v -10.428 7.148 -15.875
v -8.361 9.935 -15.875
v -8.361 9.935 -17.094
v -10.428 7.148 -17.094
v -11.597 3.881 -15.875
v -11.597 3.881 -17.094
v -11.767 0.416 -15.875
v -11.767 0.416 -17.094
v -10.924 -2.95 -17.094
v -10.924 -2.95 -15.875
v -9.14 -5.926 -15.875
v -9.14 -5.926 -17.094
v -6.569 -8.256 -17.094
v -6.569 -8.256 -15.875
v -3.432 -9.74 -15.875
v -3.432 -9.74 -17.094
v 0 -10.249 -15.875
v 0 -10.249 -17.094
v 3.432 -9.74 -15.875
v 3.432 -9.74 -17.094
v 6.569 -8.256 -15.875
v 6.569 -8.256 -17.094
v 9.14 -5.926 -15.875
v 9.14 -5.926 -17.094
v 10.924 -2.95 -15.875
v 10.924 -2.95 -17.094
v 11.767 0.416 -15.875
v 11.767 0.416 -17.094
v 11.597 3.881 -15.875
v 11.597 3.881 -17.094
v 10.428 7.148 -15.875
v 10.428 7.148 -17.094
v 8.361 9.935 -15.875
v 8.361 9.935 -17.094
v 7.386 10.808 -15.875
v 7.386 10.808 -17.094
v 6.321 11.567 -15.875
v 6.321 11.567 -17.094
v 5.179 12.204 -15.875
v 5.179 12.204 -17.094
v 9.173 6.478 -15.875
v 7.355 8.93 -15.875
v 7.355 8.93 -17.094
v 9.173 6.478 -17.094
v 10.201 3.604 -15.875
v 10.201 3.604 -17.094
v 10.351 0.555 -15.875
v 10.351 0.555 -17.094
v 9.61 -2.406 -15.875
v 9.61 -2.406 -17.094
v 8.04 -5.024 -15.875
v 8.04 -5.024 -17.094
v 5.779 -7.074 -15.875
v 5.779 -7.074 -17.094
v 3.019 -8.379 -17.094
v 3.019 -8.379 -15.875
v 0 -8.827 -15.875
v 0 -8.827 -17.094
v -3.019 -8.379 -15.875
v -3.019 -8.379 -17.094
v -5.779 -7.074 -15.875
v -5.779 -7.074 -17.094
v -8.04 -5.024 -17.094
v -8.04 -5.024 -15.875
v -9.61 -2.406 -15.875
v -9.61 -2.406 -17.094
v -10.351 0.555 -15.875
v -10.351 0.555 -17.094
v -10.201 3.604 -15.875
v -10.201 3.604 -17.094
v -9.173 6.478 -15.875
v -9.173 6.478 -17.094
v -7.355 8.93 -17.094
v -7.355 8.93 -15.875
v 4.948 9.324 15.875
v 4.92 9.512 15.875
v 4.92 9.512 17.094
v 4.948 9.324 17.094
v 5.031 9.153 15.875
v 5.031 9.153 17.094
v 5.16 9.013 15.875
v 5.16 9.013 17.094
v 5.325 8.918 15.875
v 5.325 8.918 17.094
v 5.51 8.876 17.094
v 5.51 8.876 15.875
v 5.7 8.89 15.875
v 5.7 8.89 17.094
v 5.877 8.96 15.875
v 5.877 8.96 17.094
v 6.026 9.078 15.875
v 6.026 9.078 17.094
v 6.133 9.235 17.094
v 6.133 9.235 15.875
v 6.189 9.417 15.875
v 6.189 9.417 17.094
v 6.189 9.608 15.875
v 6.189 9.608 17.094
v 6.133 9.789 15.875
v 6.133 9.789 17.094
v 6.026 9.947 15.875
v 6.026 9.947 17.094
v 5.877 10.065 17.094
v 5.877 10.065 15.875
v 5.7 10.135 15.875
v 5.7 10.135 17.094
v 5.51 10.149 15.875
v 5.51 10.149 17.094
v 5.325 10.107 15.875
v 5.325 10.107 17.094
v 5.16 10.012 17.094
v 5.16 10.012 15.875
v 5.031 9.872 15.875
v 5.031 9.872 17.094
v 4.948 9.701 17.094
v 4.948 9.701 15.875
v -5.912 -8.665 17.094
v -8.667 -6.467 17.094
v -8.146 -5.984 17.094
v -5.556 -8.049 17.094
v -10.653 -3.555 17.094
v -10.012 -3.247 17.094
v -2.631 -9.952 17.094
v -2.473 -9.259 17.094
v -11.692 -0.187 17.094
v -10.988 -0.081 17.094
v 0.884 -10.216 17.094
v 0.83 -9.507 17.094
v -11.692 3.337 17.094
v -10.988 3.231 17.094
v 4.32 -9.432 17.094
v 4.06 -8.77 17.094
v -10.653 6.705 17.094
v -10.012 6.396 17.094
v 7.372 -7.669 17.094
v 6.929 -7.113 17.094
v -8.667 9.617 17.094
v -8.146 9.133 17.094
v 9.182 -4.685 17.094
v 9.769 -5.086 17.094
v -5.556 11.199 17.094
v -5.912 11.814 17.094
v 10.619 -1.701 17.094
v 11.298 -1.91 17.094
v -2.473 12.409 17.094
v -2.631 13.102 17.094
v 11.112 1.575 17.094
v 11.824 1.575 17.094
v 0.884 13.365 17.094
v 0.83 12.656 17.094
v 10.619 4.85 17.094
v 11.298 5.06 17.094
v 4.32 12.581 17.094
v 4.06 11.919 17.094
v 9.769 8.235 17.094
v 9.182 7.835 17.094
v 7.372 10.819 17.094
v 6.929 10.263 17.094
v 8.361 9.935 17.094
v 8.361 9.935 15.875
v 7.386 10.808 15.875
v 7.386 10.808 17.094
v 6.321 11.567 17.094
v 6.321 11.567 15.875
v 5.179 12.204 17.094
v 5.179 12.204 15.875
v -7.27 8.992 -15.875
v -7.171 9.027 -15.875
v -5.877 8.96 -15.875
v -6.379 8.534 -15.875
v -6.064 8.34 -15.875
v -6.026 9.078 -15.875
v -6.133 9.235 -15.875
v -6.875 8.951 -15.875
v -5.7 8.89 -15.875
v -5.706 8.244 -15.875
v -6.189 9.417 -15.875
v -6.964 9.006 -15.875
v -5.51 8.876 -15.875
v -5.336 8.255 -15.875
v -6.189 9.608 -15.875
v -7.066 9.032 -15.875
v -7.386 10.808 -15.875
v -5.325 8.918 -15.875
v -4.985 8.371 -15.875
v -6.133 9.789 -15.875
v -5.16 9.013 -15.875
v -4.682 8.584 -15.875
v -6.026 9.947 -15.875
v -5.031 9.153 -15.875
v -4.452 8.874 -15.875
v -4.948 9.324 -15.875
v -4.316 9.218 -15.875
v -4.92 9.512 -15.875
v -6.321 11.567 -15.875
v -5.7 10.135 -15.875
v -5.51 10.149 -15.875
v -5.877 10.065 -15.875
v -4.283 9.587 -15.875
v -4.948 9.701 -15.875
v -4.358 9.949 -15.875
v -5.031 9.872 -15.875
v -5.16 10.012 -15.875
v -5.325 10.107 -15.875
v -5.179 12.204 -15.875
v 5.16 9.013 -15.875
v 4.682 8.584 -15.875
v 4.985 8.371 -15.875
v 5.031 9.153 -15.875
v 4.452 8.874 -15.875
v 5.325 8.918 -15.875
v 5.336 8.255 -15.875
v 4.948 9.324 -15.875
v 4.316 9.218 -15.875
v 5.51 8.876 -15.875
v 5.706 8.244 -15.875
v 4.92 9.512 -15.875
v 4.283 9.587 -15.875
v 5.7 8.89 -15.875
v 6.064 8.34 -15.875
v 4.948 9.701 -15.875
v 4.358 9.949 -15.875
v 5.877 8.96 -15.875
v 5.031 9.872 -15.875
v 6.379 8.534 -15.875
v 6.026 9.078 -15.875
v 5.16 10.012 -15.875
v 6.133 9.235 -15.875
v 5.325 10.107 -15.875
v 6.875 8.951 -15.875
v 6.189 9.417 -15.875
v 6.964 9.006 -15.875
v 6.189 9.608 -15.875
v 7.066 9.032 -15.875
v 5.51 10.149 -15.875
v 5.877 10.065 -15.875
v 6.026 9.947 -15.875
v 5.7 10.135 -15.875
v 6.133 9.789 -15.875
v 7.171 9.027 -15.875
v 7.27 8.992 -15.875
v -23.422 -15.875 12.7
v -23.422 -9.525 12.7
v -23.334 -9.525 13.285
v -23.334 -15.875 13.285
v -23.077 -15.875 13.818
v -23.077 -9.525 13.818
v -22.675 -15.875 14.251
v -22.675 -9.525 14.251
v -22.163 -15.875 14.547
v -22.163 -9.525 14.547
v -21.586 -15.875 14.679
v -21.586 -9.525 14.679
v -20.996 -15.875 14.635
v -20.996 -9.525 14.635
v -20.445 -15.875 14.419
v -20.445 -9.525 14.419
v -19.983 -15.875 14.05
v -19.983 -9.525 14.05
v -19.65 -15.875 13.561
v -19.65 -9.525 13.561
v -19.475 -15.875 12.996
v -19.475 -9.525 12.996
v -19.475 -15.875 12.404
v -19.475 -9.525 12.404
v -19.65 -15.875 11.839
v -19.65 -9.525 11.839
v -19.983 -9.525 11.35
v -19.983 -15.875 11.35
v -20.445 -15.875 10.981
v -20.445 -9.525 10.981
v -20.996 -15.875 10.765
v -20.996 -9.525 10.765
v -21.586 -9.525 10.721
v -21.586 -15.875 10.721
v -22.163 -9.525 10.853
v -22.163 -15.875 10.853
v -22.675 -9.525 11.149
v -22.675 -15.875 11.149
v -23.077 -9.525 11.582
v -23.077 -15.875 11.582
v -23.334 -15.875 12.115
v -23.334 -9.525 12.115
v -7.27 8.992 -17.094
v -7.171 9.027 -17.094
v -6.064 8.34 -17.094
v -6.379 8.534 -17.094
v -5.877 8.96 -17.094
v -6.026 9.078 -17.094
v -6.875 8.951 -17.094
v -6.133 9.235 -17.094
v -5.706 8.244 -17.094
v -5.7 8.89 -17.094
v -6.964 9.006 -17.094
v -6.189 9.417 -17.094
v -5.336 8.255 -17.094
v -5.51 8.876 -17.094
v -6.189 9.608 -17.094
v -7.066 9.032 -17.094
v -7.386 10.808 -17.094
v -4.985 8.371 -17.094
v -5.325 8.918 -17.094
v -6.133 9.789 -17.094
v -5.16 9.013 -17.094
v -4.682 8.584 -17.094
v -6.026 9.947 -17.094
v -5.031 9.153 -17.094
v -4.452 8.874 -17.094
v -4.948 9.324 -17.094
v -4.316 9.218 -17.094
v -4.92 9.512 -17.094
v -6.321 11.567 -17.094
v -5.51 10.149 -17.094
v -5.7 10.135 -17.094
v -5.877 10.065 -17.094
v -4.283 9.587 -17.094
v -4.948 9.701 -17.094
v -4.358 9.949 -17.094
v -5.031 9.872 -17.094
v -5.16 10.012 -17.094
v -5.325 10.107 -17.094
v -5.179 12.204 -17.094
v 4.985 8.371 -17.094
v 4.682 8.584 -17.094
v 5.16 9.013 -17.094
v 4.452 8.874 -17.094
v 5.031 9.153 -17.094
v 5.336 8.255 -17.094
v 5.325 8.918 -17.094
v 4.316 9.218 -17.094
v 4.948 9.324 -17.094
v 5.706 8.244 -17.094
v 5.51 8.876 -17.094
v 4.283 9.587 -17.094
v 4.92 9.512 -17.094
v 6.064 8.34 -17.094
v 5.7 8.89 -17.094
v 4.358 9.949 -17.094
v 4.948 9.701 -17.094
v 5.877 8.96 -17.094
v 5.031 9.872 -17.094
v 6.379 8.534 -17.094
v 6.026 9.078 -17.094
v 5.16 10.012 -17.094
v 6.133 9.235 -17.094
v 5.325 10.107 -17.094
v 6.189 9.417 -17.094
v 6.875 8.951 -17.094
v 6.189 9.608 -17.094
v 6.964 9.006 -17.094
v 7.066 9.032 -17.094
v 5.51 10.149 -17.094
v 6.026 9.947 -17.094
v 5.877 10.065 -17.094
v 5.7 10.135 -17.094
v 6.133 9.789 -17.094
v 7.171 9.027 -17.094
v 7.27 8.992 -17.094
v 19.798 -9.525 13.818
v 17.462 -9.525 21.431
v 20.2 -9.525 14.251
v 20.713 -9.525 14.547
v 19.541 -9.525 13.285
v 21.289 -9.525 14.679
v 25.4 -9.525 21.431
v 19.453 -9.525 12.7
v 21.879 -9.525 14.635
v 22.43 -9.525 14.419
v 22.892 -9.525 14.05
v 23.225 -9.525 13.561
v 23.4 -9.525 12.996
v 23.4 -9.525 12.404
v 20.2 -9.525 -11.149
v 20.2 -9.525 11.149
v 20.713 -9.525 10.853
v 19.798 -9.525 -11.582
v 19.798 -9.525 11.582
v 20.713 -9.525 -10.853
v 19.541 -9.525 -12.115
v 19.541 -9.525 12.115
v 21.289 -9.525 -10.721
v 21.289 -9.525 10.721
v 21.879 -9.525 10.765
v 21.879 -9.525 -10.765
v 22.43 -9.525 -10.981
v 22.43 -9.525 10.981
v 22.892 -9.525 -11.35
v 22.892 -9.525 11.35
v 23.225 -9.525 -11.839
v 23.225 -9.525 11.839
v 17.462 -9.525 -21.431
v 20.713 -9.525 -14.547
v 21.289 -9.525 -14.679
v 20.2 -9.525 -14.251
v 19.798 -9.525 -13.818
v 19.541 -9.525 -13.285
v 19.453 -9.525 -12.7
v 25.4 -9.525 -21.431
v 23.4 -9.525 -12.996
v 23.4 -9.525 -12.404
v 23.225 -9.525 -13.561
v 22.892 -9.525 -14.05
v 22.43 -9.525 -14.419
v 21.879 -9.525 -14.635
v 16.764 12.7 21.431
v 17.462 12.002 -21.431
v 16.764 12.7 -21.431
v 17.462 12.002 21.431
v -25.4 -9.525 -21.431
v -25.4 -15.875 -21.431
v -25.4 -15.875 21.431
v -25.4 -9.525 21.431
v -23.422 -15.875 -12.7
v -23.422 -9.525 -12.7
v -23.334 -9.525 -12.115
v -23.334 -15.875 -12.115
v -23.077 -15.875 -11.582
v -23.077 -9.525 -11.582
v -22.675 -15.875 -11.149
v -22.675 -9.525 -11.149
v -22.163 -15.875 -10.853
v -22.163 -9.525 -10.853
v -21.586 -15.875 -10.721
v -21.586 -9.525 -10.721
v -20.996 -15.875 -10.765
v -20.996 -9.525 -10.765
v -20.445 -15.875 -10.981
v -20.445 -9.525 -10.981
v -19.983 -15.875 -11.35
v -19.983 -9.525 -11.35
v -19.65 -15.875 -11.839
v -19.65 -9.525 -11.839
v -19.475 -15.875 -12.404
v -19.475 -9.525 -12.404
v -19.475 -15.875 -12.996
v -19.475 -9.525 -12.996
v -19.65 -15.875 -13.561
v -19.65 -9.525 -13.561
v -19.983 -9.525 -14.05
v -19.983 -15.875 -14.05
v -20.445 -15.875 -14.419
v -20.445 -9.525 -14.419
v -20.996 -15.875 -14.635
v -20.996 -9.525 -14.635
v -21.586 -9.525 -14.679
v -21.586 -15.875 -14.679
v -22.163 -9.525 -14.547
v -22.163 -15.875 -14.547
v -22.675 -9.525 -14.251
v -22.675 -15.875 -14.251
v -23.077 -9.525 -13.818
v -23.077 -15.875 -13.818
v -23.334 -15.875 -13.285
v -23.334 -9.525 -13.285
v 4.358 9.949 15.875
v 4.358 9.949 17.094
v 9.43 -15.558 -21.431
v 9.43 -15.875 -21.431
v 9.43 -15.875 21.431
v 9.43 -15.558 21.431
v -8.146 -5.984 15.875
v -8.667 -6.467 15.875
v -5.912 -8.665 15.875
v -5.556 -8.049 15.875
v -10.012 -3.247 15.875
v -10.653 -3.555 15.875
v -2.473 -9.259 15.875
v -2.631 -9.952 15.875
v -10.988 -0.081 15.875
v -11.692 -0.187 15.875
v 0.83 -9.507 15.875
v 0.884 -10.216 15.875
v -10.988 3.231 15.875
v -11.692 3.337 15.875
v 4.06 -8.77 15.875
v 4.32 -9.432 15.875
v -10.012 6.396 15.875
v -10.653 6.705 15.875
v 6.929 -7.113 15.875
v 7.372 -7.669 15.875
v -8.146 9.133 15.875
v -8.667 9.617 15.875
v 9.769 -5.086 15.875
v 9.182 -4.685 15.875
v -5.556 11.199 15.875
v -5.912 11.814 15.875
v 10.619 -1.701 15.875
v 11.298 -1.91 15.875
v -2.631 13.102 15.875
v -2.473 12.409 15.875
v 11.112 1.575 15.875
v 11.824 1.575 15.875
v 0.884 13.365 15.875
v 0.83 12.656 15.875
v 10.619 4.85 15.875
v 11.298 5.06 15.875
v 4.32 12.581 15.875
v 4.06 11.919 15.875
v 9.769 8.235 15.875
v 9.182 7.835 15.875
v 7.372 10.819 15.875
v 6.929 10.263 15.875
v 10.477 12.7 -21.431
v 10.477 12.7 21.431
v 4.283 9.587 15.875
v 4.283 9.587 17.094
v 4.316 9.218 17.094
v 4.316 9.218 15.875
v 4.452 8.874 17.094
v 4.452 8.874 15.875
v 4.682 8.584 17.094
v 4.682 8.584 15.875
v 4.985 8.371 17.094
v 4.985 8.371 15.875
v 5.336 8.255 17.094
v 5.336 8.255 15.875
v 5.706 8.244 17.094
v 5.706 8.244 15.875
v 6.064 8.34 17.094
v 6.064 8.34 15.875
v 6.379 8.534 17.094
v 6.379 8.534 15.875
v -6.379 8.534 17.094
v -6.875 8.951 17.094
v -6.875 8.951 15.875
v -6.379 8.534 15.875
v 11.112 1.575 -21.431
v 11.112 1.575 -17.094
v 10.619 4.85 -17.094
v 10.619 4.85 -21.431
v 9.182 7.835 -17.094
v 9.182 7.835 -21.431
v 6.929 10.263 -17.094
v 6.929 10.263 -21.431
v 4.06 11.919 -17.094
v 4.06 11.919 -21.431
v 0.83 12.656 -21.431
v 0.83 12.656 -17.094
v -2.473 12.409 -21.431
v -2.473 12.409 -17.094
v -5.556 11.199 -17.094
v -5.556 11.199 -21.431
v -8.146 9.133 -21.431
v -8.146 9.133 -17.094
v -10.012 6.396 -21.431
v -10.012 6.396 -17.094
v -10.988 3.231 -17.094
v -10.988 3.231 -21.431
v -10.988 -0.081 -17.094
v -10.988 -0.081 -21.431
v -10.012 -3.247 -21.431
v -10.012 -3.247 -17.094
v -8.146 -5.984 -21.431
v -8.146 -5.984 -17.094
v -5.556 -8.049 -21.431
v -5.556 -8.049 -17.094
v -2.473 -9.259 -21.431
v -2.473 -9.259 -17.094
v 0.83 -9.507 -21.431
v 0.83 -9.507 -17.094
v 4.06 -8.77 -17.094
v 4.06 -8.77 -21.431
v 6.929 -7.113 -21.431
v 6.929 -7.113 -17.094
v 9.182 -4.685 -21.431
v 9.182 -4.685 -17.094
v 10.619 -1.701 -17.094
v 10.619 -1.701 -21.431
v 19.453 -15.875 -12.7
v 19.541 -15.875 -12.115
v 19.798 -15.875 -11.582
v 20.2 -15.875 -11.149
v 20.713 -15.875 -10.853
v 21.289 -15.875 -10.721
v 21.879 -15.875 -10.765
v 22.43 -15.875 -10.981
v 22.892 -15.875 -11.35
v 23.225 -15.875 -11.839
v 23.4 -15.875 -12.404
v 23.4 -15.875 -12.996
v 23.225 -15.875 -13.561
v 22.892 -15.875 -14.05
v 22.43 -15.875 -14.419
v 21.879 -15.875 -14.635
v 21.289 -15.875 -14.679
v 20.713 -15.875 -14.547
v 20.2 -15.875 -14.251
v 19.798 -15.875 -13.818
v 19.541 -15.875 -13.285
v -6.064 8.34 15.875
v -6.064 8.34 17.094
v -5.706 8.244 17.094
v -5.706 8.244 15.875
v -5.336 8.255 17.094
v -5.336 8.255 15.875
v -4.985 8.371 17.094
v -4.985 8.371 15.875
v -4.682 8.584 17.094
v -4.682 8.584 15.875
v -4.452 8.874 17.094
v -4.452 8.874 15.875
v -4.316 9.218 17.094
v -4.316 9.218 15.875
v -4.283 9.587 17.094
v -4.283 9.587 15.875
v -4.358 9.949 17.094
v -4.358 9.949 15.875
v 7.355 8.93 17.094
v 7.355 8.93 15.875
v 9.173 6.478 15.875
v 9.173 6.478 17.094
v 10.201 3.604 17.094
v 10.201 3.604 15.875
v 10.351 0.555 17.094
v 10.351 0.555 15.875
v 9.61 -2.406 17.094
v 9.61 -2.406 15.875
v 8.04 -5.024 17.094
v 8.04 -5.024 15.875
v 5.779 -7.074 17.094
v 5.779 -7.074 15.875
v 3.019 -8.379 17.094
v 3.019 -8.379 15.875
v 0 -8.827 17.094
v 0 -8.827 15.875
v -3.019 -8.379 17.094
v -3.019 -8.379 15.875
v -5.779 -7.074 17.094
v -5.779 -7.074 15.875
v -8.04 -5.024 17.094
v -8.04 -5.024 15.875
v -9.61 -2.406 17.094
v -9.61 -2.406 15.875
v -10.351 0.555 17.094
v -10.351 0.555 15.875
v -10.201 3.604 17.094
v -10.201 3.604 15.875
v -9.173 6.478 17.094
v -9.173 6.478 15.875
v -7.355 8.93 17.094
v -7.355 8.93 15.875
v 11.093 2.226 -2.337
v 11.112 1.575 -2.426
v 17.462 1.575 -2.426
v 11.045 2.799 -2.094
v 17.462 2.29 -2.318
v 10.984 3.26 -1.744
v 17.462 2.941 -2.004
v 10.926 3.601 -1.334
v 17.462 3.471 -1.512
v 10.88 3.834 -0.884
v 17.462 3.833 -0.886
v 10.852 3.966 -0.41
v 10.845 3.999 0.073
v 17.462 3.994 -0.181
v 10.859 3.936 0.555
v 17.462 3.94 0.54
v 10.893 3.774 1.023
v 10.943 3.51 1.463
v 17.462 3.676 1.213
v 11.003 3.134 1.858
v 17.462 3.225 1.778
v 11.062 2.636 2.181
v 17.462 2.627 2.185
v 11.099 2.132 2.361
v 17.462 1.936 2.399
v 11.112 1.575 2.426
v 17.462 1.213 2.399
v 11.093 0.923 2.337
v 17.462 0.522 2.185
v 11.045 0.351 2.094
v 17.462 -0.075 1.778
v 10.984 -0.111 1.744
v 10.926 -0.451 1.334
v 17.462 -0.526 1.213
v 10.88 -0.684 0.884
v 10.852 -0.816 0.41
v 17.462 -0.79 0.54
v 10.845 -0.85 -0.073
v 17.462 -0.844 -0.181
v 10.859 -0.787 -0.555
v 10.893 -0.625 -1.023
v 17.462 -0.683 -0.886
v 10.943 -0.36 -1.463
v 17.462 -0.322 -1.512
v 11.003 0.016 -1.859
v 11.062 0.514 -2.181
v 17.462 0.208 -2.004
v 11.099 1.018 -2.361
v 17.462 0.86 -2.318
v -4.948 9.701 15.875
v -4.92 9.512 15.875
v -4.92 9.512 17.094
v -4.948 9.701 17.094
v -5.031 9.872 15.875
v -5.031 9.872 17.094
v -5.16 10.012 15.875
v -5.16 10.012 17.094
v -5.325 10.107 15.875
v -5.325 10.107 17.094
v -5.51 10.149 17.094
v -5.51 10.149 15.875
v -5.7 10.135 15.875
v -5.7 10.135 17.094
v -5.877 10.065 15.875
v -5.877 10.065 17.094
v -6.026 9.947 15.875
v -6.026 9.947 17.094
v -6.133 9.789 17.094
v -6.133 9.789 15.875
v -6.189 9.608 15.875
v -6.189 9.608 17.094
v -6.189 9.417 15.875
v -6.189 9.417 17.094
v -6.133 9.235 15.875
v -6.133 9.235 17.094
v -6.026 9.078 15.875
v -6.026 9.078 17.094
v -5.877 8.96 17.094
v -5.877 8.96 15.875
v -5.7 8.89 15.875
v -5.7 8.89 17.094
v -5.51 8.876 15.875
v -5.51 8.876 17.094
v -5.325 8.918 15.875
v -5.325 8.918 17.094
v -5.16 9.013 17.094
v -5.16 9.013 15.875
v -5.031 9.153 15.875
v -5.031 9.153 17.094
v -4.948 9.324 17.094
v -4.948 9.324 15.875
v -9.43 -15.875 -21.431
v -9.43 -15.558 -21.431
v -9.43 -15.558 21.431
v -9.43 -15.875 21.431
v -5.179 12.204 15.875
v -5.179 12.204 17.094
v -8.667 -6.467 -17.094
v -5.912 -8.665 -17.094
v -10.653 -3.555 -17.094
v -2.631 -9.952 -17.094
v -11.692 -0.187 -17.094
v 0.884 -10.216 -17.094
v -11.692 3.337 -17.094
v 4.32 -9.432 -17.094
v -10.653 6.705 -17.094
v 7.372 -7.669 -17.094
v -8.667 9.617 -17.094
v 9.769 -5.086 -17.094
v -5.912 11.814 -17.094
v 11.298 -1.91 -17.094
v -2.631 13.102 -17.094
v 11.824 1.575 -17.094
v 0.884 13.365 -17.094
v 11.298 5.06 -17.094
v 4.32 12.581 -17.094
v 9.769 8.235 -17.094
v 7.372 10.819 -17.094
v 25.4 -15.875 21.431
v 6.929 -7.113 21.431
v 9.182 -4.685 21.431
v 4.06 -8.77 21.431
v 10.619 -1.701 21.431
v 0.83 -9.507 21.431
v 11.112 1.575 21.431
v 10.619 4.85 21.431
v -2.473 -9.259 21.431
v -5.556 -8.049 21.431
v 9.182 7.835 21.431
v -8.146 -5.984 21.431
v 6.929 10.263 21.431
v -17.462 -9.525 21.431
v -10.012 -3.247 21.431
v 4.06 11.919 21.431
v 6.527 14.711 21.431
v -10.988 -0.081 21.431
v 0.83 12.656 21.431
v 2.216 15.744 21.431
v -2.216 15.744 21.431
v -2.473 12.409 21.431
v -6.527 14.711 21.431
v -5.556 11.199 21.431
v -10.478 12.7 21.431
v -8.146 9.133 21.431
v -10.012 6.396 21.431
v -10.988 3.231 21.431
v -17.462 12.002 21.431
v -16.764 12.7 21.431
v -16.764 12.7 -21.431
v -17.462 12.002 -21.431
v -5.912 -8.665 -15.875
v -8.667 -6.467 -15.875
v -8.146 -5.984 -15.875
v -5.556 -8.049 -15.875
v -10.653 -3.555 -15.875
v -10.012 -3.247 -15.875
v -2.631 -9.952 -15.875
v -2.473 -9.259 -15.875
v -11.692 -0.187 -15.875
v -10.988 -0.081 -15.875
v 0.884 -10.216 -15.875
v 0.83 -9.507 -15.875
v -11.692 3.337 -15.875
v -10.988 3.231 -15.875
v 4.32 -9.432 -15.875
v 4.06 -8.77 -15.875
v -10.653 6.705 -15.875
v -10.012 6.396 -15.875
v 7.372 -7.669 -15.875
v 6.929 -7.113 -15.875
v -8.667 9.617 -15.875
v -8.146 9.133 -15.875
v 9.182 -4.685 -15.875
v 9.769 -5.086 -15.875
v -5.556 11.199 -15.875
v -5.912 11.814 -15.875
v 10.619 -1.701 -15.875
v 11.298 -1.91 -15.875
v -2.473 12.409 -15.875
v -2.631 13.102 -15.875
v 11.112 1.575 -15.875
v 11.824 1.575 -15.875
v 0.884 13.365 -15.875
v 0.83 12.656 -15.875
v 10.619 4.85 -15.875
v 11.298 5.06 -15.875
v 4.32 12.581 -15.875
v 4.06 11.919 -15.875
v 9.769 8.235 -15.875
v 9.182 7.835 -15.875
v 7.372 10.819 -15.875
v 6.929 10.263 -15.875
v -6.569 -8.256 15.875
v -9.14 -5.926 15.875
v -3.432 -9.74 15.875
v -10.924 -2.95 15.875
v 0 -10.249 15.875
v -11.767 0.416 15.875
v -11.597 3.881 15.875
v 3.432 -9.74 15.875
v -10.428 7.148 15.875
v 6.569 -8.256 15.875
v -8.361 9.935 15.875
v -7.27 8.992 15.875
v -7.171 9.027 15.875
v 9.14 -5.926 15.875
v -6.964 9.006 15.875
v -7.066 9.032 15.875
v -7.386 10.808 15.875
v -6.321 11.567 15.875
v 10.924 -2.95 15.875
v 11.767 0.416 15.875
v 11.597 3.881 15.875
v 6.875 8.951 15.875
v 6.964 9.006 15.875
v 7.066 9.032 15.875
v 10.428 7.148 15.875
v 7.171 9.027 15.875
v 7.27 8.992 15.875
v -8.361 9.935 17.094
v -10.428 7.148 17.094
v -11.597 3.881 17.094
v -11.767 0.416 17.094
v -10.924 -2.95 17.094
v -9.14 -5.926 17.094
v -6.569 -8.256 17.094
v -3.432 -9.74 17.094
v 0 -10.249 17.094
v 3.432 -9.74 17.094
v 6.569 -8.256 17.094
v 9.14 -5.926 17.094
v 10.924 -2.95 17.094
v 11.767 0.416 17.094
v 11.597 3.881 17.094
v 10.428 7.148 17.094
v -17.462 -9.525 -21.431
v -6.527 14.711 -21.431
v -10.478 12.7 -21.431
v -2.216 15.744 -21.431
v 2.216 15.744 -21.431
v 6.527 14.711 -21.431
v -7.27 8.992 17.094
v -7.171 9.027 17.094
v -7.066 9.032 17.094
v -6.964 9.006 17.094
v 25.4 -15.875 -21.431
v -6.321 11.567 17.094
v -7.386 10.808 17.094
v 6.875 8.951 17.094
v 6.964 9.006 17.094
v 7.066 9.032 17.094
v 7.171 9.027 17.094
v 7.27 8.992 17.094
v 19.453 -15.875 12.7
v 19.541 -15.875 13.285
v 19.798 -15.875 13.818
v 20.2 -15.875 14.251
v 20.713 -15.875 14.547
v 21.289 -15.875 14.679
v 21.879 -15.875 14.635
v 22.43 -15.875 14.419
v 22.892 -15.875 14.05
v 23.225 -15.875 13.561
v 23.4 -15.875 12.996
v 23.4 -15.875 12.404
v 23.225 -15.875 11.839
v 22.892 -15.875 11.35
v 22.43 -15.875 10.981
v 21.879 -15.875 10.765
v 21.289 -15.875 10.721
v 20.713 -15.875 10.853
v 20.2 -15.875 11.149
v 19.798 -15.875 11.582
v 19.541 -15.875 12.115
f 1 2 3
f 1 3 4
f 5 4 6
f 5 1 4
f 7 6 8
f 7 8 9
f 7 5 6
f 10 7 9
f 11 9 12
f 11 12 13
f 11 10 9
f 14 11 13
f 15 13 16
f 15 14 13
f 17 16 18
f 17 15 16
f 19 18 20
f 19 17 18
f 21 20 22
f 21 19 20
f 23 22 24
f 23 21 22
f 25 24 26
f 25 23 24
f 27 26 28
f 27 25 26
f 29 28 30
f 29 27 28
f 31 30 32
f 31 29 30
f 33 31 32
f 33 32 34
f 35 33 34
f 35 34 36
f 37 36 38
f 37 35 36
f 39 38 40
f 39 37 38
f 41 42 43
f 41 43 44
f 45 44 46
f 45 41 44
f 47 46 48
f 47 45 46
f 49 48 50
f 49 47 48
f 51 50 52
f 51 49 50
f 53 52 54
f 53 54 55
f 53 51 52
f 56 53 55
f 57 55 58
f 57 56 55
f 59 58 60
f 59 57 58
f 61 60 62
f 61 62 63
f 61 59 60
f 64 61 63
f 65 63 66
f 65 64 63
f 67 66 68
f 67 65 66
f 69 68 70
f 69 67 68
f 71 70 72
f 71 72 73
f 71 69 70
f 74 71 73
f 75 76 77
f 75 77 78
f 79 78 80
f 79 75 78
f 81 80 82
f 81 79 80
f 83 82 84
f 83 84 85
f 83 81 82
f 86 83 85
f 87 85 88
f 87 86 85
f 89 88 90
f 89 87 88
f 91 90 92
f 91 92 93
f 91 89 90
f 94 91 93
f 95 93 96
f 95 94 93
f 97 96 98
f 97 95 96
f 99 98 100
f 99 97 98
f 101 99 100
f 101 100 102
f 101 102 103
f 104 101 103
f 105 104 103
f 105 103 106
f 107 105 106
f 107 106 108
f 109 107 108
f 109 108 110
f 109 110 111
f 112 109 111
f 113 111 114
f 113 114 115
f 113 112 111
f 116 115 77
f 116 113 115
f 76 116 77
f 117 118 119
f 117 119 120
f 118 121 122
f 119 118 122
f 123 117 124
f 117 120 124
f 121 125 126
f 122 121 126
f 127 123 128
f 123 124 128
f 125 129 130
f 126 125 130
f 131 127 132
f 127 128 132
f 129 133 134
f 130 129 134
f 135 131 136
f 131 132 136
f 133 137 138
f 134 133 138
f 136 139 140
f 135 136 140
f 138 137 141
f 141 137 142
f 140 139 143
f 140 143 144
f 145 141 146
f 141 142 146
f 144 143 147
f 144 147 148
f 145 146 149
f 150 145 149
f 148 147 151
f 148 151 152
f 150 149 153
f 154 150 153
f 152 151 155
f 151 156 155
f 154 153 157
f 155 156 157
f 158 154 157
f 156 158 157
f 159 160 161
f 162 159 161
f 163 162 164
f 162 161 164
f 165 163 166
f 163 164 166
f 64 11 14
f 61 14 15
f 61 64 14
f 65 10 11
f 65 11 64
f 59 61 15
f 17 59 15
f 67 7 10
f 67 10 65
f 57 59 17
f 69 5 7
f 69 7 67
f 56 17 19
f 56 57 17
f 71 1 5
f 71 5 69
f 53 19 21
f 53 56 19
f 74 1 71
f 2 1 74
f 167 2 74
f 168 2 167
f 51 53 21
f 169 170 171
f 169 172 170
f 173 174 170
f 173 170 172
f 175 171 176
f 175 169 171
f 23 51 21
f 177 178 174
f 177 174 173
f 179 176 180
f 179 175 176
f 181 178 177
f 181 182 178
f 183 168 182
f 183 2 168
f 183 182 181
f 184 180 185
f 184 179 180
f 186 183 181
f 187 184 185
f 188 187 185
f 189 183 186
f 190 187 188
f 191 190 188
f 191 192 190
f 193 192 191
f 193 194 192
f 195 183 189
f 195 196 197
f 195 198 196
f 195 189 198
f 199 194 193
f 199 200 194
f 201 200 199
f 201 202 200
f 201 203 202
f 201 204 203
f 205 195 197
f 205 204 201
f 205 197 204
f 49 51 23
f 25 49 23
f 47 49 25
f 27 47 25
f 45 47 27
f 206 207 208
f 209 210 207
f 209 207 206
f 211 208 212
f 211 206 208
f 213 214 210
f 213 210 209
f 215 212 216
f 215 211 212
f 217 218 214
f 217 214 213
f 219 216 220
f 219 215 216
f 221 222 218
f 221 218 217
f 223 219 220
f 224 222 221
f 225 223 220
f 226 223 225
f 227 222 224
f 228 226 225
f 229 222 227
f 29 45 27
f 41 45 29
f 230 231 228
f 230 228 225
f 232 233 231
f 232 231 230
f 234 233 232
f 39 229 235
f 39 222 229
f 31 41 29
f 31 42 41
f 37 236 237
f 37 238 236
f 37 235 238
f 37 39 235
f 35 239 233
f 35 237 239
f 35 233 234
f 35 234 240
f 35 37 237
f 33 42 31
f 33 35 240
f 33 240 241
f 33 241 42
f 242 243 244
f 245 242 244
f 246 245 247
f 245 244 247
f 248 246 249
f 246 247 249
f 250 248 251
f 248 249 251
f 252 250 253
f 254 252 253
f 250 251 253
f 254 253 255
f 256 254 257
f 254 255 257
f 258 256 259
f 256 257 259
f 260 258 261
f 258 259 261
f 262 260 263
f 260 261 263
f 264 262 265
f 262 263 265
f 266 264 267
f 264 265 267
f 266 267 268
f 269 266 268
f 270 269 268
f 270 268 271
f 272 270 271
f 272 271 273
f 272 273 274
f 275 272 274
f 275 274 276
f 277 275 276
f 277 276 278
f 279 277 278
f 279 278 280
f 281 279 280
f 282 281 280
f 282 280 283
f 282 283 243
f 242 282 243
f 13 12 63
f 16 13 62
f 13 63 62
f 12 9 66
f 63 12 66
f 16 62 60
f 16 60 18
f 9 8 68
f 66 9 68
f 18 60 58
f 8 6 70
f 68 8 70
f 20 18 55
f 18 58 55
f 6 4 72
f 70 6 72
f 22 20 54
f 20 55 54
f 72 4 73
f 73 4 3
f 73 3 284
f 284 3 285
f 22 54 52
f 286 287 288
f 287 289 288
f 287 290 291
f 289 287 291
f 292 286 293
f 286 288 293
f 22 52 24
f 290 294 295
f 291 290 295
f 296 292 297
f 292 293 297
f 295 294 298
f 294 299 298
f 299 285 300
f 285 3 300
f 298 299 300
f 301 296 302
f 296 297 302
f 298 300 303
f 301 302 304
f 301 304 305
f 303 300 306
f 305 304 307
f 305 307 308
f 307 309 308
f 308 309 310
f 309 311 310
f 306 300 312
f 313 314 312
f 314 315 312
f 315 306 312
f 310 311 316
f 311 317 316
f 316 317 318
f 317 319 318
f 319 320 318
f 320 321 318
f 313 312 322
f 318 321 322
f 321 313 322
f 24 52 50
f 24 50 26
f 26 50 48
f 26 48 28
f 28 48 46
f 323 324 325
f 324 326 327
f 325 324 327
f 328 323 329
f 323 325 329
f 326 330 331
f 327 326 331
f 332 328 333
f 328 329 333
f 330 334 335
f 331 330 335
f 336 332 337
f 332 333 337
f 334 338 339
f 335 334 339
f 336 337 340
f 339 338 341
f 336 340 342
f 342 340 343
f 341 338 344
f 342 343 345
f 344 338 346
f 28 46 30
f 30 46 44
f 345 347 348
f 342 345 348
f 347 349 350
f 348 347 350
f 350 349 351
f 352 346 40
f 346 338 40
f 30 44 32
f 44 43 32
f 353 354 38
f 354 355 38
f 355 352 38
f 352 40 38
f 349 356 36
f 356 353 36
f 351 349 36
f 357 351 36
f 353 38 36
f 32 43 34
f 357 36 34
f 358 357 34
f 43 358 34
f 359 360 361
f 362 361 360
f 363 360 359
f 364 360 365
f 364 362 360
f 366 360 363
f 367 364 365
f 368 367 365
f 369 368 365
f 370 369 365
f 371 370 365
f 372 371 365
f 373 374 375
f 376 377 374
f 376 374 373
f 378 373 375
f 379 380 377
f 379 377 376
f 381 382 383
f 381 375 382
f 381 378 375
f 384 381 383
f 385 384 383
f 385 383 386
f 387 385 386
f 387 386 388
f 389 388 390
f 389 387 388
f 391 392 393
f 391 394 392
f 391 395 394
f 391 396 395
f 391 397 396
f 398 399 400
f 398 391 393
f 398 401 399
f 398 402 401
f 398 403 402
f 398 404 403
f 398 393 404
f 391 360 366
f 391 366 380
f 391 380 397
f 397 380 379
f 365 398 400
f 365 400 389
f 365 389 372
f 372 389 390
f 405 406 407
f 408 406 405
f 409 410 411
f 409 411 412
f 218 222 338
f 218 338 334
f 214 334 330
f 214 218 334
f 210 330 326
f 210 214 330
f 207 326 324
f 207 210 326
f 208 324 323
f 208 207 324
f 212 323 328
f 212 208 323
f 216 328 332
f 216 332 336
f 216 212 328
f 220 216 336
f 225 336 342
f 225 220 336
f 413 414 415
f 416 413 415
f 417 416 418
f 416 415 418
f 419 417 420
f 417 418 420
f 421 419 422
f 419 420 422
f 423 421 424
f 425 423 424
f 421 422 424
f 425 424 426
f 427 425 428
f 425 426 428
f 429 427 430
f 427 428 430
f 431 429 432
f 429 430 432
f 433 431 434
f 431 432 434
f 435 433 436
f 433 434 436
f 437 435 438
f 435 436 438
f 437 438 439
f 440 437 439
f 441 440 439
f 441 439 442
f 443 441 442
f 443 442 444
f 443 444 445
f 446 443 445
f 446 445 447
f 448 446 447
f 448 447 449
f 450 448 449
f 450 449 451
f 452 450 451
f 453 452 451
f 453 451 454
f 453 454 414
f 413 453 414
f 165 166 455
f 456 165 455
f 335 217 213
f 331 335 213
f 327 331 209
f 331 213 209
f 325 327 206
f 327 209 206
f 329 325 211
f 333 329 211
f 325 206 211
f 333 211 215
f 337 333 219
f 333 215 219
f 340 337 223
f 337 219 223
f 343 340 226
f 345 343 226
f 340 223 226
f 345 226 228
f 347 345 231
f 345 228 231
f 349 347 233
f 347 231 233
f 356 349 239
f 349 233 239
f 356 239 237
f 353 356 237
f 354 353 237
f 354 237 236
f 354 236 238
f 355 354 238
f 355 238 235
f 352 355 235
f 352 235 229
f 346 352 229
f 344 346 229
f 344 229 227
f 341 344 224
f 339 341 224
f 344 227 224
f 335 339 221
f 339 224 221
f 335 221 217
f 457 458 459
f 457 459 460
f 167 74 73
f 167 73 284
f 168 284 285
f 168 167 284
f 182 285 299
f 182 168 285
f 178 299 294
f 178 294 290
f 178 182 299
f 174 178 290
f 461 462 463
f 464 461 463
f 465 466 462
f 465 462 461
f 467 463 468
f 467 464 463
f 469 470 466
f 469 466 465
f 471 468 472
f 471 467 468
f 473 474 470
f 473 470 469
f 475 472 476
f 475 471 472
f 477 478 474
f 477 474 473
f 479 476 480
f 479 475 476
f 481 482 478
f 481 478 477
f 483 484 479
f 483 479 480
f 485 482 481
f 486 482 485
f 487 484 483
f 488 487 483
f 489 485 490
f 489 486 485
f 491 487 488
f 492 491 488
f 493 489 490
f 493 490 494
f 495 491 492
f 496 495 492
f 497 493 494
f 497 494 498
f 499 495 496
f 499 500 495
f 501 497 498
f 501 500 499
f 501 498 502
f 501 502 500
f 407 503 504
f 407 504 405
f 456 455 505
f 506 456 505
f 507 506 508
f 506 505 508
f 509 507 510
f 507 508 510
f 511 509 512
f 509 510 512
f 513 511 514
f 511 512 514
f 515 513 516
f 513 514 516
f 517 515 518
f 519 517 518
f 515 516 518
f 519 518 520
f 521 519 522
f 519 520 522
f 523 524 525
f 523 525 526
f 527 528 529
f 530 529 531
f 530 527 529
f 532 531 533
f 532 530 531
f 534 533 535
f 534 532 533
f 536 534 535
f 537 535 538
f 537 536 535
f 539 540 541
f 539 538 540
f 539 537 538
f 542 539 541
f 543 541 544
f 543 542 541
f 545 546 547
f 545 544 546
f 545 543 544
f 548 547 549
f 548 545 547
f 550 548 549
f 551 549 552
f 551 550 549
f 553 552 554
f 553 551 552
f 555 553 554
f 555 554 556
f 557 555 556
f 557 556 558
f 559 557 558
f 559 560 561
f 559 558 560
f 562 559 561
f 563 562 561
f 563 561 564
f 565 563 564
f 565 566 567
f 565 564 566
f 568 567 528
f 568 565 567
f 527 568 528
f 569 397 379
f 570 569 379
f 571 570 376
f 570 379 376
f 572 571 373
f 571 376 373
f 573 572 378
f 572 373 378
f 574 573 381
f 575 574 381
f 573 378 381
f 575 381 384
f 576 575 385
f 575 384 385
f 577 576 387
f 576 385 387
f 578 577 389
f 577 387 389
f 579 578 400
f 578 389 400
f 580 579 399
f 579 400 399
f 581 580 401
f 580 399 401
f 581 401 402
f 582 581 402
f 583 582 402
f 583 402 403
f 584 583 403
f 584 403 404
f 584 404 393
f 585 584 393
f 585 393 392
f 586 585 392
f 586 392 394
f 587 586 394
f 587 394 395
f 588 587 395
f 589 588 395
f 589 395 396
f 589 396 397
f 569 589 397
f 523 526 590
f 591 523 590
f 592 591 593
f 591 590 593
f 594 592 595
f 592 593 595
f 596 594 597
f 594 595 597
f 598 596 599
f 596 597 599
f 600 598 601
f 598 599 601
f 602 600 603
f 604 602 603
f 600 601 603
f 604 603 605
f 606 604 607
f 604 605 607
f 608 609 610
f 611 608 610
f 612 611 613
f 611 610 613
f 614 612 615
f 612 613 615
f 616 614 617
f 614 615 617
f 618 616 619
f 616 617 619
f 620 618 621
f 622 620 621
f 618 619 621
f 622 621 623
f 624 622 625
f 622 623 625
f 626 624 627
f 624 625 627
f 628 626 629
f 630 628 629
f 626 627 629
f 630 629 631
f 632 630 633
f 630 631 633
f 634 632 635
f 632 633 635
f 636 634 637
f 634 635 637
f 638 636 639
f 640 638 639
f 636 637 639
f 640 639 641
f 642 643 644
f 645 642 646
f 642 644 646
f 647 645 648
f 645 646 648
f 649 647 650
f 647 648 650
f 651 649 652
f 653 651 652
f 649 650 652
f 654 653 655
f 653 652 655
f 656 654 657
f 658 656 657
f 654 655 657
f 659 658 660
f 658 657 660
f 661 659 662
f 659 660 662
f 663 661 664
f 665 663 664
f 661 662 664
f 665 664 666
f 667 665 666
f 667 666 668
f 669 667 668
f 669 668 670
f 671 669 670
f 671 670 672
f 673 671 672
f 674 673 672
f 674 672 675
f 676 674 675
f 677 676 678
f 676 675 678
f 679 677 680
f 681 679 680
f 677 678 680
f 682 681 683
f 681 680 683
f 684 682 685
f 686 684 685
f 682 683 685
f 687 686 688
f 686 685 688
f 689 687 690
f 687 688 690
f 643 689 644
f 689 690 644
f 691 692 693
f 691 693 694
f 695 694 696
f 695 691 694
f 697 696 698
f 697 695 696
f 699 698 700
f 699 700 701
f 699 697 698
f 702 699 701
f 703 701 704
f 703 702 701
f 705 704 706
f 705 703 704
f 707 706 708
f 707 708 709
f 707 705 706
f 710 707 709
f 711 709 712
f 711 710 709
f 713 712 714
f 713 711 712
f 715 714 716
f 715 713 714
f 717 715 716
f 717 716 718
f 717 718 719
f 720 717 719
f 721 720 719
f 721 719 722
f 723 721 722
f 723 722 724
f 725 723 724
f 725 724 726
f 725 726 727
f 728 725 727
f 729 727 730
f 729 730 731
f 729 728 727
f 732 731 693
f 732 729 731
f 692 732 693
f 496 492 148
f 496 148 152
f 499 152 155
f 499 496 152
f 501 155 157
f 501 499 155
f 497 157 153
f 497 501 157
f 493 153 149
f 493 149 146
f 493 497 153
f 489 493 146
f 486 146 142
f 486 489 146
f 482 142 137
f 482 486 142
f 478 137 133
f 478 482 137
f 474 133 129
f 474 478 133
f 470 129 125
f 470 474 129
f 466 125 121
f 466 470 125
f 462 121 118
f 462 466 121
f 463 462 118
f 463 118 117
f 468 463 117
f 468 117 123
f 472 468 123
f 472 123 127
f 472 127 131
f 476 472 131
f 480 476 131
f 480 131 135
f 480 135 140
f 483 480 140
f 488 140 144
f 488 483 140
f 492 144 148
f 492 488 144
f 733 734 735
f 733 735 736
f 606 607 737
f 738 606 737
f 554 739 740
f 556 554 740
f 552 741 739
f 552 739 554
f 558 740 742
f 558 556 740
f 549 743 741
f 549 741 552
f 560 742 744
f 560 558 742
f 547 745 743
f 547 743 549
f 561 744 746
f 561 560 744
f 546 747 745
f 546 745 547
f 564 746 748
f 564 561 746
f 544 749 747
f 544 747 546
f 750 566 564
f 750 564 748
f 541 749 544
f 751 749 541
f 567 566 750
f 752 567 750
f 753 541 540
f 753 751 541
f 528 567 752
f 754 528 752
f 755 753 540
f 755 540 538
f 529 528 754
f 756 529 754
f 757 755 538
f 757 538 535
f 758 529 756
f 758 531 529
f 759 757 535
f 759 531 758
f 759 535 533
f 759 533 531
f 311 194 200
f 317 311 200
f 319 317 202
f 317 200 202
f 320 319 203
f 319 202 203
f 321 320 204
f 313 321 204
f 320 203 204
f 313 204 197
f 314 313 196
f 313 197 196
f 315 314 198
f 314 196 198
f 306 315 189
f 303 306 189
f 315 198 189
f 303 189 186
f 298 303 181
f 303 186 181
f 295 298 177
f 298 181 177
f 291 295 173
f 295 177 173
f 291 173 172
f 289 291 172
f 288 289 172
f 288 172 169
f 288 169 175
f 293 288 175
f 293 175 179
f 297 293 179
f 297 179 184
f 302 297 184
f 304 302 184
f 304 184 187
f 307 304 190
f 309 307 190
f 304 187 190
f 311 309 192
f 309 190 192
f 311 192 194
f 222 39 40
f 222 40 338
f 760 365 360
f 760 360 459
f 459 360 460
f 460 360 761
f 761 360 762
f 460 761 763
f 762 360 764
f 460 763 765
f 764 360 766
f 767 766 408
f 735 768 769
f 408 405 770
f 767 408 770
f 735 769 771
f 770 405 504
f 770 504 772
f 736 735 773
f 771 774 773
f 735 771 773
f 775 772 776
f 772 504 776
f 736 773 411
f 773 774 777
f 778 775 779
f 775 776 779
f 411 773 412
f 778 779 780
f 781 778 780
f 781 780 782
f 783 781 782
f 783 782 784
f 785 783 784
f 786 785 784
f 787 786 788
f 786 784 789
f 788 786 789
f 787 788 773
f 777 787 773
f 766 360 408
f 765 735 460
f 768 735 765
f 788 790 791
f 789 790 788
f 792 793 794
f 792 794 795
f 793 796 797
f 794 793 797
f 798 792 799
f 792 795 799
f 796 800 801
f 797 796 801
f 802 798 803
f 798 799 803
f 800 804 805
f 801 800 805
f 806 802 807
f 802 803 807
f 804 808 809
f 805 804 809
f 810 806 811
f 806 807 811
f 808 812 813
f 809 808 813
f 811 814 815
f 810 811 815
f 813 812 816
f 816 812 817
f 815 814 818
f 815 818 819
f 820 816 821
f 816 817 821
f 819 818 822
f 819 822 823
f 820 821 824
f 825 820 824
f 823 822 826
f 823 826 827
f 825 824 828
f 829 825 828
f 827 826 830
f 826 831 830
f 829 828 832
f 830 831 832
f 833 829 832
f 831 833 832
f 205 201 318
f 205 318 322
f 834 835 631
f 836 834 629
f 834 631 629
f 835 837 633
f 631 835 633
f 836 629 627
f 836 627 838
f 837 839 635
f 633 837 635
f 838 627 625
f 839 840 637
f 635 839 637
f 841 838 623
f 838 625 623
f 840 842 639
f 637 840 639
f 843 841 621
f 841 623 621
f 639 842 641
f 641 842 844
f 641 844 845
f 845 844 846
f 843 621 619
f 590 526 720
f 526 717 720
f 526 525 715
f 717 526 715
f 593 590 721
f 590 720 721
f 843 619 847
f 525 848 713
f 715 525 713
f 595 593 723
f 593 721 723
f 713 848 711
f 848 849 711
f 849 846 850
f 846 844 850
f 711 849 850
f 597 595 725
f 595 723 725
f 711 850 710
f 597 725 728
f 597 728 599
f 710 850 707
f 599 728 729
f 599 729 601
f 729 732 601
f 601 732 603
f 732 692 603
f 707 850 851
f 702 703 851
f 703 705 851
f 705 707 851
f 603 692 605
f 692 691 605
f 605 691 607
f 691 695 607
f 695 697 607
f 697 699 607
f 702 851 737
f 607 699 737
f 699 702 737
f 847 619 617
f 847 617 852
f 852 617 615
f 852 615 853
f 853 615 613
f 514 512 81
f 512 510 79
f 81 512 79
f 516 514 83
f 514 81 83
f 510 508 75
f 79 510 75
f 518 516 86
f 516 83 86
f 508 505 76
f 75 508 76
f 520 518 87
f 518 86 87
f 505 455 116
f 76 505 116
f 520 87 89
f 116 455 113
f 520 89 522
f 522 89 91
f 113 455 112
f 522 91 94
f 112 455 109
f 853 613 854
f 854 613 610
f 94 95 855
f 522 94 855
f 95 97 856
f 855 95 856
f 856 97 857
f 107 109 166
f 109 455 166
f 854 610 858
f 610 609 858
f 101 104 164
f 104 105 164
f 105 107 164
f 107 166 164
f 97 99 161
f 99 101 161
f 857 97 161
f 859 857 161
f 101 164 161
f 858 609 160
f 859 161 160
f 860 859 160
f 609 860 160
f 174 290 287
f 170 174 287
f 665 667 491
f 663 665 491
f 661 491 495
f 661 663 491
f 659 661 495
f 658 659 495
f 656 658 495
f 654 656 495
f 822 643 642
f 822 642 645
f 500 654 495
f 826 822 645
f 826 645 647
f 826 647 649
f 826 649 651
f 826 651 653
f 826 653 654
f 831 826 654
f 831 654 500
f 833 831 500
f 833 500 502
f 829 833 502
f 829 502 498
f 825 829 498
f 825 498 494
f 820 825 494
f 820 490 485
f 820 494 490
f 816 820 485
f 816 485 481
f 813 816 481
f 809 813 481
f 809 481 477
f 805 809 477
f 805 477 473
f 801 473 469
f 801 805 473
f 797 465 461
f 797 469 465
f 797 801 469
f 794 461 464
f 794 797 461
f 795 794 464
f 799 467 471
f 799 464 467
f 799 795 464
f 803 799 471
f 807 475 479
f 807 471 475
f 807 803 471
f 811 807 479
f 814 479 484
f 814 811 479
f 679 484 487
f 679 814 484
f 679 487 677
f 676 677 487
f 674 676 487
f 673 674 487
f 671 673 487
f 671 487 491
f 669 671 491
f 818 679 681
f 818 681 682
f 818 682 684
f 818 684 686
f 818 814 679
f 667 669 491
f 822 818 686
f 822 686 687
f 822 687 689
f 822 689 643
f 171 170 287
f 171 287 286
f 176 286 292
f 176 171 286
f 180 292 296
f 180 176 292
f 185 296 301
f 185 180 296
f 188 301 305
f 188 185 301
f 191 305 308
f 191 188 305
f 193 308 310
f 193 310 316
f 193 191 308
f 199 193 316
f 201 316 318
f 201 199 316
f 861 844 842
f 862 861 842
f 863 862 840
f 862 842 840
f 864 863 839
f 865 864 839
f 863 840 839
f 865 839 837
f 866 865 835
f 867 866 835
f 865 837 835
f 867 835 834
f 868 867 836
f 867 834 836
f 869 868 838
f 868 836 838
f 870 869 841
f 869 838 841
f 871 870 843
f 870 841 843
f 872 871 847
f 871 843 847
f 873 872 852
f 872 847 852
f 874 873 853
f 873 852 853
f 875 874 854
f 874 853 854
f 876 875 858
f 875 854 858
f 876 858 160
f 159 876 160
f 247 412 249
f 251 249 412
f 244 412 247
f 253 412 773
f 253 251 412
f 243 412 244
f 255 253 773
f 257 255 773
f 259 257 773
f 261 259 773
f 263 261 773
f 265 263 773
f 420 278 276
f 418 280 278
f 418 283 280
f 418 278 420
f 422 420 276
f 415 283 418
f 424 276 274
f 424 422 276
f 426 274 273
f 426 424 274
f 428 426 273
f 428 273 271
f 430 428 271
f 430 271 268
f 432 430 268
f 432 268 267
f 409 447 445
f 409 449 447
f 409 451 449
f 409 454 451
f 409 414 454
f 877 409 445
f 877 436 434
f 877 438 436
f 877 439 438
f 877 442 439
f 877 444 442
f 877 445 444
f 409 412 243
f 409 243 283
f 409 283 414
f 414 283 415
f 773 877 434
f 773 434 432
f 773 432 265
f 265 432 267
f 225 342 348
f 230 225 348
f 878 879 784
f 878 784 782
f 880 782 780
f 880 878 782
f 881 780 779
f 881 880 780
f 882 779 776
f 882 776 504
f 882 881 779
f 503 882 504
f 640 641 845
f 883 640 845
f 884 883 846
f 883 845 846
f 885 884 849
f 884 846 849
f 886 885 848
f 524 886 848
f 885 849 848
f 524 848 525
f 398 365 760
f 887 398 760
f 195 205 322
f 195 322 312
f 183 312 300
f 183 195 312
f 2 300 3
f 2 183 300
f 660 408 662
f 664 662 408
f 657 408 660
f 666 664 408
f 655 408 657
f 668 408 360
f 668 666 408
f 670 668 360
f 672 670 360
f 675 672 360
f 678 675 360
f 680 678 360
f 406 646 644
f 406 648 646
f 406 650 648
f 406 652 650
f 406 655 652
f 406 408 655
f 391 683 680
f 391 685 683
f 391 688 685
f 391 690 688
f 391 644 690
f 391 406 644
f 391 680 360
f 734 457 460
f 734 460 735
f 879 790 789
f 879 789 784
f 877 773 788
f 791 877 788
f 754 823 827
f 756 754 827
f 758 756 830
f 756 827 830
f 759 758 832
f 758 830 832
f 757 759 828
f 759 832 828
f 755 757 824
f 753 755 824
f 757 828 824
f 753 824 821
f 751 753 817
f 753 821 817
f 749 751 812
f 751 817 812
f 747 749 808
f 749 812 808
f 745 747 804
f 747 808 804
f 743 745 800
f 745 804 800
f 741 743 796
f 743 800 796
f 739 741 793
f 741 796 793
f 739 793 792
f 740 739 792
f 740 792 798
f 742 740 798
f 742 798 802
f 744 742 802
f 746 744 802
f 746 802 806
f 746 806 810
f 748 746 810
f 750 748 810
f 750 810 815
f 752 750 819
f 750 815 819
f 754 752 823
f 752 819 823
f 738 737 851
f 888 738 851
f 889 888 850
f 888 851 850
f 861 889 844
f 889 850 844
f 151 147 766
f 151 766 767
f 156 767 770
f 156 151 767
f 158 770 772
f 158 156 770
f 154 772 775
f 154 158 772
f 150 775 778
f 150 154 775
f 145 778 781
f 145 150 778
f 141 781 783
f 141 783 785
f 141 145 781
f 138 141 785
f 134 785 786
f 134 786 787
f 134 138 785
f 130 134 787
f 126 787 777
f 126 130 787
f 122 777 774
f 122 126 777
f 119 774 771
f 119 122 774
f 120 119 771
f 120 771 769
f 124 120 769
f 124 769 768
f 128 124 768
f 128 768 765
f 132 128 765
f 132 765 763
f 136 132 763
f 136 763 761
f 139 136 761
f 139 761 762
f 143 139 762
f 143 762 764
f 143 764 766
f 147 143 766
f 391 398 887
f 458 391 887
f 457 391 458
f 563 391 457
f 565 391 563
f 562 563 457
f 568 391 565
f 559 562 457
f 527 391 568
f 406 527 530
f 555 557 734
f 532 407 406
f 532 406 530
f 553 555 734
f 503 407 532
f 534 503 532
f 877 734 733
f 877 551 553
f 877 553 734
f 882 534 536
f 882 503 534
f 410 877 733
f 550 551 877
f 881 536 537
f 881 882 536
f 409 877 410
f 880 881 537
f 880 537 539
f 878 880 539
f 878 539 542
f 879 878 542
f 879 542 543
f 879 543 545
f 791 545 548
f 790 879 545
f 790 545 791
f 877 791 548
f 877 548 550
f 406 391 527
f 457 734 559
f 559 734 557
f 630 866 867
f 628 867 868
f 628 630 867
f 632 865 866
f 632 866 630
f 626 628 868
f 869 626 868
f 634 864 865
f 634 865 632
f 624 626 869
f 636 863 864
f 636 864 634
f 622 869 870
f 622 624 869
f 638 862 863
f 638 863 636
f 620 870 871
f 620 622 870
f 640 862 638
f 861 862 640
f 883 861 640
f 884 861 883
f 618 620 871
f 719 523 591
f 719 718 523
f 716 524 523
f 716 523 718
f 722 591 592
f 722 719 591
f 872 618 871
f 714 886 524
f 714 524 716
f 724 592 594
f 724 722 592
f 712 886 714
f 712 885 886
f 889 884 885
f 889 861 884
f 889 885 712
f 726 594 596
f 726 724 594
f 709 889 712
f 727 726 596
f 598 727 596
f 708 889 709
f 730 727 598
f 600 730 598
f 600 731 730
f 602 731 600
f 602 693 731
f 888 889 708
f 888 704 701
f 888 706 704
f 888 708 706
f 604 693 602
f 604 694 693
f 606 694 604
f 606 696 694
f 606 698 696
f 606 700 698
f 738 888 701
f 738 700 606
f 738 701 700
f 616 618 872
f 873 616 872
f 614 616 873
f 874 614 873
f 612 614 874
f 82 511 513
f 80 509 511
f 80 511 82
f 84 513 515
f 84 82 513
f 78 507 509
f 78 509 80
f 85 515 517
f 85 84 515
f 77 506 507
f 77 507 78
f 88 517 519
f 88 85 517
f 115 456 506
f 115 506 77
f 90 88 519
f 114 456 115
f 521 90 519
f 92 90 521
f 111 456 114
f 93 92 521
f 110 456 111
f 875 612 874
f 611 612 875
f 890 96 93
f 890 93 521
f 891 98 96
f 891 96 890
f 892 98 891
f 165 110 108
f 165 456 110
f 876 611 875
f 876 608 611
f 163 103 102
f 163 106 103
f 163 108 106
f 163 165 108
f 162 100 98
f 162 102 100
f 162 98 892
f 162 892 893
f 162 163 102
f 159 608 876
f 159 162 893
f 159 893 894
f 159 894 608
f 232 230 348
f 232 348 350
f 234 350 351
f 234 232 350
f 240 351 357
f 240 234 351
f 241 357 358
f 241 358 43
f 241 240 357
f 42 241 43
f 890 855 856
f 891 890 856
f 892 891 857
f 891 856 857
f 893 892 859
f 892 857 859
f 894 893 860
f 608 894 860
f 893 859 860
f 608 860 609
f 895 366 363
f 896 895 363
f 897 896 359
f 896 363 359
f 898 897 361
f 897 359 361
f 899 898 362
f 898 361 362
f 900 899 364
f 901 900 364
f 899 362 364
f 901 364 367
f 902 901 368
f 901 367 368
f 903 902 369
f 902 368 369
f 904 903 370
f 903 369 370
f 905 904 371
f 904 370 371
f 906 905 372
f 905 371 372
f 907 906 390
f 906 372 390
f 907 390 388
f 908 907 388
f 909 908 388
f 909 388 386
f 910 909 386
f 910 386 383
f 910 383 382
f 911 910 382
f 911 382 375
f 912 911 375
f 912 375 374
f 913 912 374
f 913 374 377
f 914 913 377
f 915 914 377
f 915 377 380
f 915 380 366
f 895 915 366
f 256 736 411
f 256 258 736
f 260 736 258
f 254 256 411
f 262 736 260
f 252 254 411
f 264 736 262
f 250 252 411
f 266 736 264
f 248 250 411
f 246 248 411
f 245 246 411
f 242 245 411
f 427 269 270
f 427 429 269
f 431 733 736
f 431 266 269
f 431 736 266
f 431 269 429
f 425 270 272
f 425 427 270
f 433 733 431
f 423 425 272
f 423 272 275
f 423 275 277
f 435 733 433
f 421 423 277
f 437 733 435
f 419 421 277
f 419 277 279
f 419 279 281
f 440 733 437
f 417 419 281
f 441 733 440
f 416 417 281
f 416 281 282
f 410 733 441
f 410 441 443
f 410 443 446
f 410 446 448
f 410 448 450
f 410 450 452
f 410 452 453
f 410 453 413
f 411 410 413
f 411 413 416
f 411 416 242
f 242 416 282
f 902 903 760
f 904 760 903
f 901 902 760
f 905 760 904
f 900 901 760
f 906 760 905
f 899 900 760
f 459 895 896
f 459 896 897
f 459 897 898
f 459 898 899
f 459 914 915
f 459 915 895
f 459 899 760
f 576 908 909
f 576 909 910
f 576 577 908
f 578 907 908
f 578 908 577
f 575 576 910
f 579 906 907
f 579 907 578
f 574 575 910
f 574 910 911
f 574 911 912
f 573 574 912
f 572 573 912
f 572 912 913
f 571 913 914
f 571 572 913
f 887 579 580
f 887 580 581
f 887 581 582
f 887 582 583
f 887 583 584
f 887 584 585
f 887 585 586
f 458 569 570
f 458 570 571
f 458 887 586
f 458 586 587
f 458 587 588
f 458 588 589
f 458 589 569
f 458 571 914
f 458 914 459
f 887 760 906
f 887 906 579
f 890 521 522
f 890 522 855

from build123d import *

# Parameters (mm, degrees)
BOSS_EXTRUDE1_START     = -21.43125
SKETCH4_R               = 11.1125
BOSS_EXTRUDE1_DEPTH     = 42.8625
SKETCH5_R               = 1.984375
CUT_EXTRUDE1_DEPTH      = 42.828441001
CHAMFER1_SIZE           = 0.6985
SKETCH6_R               = 11.8237
CUT_EXTRUDE2_DEPTH      = 1.2192
CUT_EXTRUDE3_REACH      = 52.483
CUT_EXTRUDE3_END_RADIUS = 11.1125
SKETCH7_R               = 2.4257
SKETCH8_R               = 0.638420992
BOSS_EXTRUDE2_DEPTH     = 1.2192


with BuildPart() as part:
    # Sketch4 → Boss-Extrude1 (new body)
    with BuildSketch(Plane.XY.offset(BOSS_EXTRUDE1_START)):
        with BuildLine():
            Line((-25.4, -9.525), (-17.4625, -9.525))
            Line((-17.4625, -9.525), (-17.4625, 12.7))
            Line((-17.4625, 12.7), (-10.4775, 12.7))
            ThreePointArc((-10.4775, 12.7), (0, 15.875), (10.4775, 12.7))
            Line((10.4775, 12.7), (17.4625, 12.7))
            Line((17.4625, 12.7), (17.4625, -9.525))
            Line((17.4625, -9.525), (25.4, -9.525))
            Line((25.4, -9.525), (25.4, -15.875))
            Line((25.4, -15.875), (9.42975, -15.875))
            Line((9.42975, -15.875), (9.42975, -15.5575))
            Line((9.42975, -15.5575), (-9.42975, -15.5575))
            Line((-9.42975, -15.5575), (-9.42975, -15.875))
            Line((-9.42975, -15.875), (-25.4, -15.875))
            Line((-25.4, -15.875), (-25.4, -9.525))
        make_face()
        with Locations((0, 1.5748)):
            Circle(SKETCH4_R, mode=Mode.SUBTRACT)
    extrude(amount=BOSS_EXTRUDE1_DEPTH)

    # Sketch5 → Cut-Extrude1 (cut, through all)
    with BuildSketch(Plane(origin=(0, -9.525, 0), x_dir=(1, 0, 0), z_dir=(0, 1, 0))):
        with Locations(Location((-21.4376, 12.7, 0), (0, 0, 180))):
            Circle(SKETCH5_R)
        with Locations(Location((21.4376, 12.7, 0), (0, 0, 180))):
            Circle(SKETCH5_R)
        with Locations(Location((21.4376, -12.7, 0), (0, 0, 180))):
            Circle(SKETCH5_R)
        with Locations(Location((-21.4376, -12.7, 0), (0, 0, 180))):
            Circle(SKETCH5_R)
    extrude(amount=-CUT_EXTRUDE1_DEPTH, mode=Mode.SUBTRACT)

    # Chamfer1
    chamfer1_edges = [part.edges().sort_by_distance(p)[0] for p in [
        (-17.4625, 12.7, 0),
        (17.4625, 12.7, 0),
    ]]
    chamfer(chamfer1_edges, length=CHAMFER1_SIZE)

    # Sketch6 → Cut-Extrude2 (cut)
    with BuildSketch(Plane.XY.offset(15.875)):
        with Locations((0, 1.5748)):
            Circle(SKETCH6_R)
    cut_extrude2 = extrude(amount=CUT_EXTRUDE2_DEPTH, mode=Mode.SUBTRACT)

    # Mirror1: Cut-Extrude2 across plane
    add(cut_extrude2.mirror(Plane.XY), mode=Mode.SUBTRACT)

    # Cut-Extrude3: up to this cylinder (the profile starts outside it)
    cut_extrude3_end = Plane(origin=(0, 1.5748, 0), z_dir=(0, 0, -1)) * Cylinder(CUT_EXTRUDE3_END_RADIUS, 128.191, mode=Mode.PRIVATE)
    # Sketch7 → Cut-Extrude3 (cut, up to the surface)
    with BuildSketch(Plane(origin=(17.4625, 0, 0), x_dir=(0, 0, -1), z_dir=(1, 0, 0)), mode=Mode.PRIVATE) as cut_extrude3_sk1:
        with Locations((0, 1.5748)):
            Circle(SKETCH7_R)
    cut_extrude3_tool1 = extrude(cut_extrude3_sk1.sketch, amount=-CUT_EXTRUDE3_REACH, mode=Mode.PRIVATE) - cut_extrude3_end
    add(cut_extrude3_tool1.solids().sort_by_distance((17.4625, 1.5748, 0))[0], mode=Mode.SUBTRACT)


with BuildPart() as body_2:
    # Sketch8 → Boss-Extrude2 (new body)
    with BuildSketch(Plane.XY.offset(15.875)):
        with BuildLine():
            Line((-4.358174036, 9.949170903), (-5.178855249, 12.203974004))
            ThreePointArc((-5.178855249, 12.203974004), (-6.864103953, 11.202050834), (-8.360618449, 9.935418449))
            ThreePointArc((-8.360618449, 9.935418449), (0, -10.2489), (8.360618449, 9.935418449))
            ThreePointArc((8.360618449, 9.935418449), (6.864103953, 11.202050834), (5.178855249, 12.203974004))
            Line((5.178855249, 12.203974004), (4.358174036, 9.949170903))
            ThreePointArc((4.358174036, 9.949170903), (4.825646551, 8.466537503), (6.378751233, 8.534347518))
            Line((6.378751233, 8.534347518), (6.874807318, 8.950587996))
            ThreePointArc((6.874807318, 8.950587996), (7.118893646, 9.033444139), (7.354829763, 8.929629763))
            ThreePointArc((7.354829763, 8.929629763), (0, -8.8265), (-7.354829763, 8.929629763))
            ThreePointArc((-7.354829763, 8.929629763), (-7.118893646, 9.033444139), (-6.874807318, 8.950587996))
            Line((-6.874807318, 8.950587996), (-6.378751233, 8.534347518))
            ThreePointArc((-6.378751233, 8.534347518), (-4.825646551, 8.466537503), (-4.358174036, 9.949170903))
        make_face()
        with Locations((-5.558013026, 9.512465224)):
            Circle(SKETCH8_R, mode=Mode.SUBTRACT)
        with Locations(Location((5.558013026, 9.512465224, 0), (0, 0, 180))):
            Circle(SKETCH8_R, mode=Mode.SUBTRACT)
    extrude(amount=BOSS_EXTRUDE2_DEPTH)


with BuildPart() as body_3:
    # Mirror2: mirrored copy
    add(body_2.part.mirror(Plane.XY))


solid = Compound([part.part, body_2.part, body_3.part])
